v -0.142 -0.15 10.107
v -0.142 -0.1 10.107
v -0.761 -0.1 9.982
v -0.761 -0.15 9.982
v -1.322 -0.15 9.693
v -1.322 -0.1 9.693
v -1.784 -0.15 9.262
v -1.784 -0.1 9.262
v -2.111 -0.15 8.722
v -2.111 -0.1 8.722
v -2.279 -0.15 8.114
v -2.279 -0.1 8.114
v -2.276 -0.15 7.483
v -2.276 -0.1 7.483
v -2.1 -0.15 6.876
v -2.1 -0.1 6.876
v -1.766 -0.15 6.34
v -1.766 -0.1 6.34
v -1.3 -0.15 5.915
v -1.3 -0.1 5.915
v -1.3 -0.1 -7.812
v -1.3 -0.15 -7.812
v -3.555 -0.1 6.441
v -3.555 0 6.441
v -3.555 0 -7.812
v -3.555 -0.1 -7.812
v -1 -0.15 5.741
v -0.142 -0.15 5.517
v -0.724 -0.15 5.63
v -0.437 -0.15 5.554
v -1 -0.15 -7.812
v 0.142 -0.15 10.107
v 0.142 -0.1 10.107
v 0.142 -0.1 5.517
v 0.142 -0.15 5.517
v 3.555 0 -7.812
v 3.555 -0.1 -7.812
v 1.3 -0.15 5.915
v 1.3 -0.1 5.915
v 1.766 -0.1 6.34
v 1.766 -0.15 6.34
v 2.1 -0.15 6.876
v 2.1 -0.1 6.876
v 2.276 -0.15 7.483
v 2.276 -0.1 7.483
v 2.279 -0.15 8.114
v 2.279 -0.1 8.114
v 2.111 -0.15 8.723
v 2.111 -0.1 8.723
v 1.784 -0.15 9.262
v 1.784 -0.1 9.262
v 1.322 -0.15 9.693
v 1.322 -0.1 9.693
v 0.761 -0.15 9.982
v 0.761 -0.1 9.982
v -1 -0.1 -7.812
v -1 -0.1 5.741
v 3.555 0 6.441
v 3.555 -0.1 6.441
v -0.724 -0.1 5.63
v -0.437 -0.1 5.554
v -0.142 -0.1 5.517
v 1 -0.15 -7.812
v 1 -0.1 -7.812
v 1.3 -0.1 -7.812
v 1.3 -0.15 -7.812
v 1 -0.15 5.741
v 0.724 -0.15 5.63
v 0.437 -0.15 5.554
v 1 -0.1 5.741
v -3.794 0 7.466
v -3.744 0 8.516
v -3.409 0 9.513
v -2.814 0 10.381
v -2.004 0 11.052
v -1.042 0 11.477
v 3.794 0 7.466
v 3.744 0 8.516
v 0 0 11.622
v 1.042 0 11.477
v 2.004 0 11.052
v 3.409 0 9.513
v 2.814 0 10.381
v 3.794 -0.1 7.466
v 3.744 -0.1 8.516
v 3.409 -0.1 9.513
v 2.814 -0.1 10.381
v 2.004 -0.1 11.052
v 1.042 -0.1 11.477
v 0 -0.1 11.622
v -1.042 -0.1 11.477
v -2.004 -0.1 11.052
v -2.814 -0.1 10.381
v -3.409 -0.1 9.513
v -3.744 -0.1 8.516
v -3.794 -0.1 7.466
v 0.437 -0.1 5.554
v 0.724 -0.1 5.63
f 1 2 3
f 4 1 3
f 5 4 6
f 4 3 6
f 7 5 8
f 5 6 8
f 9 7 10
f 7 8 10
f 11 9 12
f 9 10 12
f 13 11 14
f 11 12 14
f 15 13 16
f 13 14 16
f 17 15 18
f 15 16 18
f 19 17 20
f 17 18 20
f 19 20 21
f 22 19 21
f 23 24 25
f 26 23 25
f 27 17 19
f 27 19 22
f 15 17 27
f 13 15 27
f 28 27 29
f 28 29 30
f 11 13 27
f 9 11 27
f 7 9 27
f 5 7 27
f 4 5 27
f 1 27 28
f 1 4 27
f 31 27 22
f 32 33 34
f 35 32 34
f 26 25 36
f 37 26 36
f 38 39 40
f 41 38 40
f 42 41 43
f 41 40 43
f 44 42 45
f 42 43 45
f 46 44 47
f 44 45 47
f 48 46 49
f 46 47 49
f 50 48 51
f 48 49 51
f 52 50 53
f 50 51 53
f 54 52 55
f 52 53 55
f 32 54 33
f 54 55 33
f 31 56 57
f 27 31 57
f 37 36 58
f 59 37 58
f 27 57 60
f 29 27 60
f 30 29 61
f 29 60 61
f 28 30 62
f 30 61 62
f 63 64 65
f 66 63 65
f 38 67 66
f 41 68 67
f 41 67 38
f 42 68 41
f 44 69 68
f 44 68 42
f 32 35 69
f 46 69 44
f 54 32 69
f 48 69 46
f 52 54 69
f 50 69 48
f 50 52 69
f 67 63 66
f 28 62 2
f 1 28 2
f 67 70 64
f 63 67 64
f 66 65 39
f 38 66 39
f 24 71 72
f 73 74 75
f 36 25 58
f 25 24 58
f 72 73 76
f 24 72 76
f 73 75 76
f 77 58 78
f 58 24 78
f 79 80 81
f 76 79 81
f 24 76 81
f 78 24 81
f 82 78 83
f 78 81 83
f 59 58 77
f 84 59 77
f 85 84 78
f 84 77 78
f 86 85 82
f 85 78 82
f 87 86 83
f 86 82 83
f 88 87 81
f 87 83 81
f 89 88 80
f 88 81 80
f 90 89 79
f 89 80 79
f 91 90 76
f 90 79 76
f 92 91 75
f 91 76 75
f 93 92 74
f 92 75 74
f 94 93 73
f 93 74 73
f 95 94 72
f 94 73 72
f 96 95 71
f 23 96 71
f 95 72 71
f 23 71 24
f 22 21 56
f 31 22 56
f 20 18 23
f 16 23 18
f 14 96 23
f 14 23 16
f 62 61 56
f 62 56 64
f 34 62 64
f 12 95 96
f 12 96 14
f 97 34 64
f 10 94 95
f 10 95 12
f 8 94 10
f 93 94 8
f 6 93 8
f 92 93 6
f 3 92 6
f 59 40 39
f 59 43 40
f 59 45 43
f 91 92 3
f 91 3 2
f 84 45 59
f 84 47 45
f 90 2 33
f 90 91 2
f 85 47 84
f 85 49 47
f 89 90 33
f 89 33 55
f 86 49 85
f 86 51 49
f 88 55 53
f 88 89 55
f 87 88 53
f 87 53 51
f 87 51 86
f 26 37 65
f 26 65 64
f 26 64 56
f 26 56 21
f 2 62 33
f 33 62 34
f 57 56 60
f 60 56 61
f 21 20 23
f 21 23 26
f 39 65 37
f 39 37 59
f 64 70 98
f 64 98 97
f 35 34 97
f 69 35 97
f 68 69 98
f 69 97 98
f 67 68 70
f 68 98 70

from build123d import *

# Parameters (mm, degrees)
F1_DEPTH = 0.1
F3_DEPTH = 0.05


with BuildPart() as f1:
    # F0 (on Front) → F1 (new body)
    with BuildSketch(Plane.XZ):
        with BuildLine():
            Line((-3.555, -7.811804), (3.555, -7.811804))
            Line((3.555, -7.811804), (3.555, 6.441375))
            ThreePointArc((3.555, 6.441375), (0, 11.621804), (-3.555, 6.441375))
            Line((-3.555, 6.441375), (-3.555, -7.811804))
        make_face()
    extrude(amount=F1_DEPTH)

    # F2 (on face) → F3 (join)
    with BuildSketch(Plane.XZ.offset(0.1)):
        with BuildLine():
            Line((-0.141701, 5.516975), (-0.141713, 10.106631))
            ThreePointArc((-0.141713, 10.106631), (-2.216193, 8.424019), (-1.2996, 5.915133))
            Line((-1.2996, 5.915133), (-1.2996, -7.811803))
            Line((-1.2996, -7.811803), (-0.9996, -7.811803))
            Line((-0.9996, -7.811803), (-0.9996, 5.741268))
            ThreePointArc((-0.9996, 5.741268), (-0.581566, 5.587371), (-0.141701, 5.516975))
        make_face()
        with BuildLine():
            ThreePointArc((1.2996, 5.915133), (2.216191, 8.424025), (0.141701, 10.106632))
            Line((0.141701, 10.106632), (0.141713, 5.516976))
            ThreePointArc((0.141713, 5.516976), (0.581571, 5.587373), (0.9996, 5.741268))
            Line((0.9996, 5.741268), (0.9996, -7.811803))
            Line((0.9996, -7.811803), (1.2996, -7.811803))
            Line((1.2996, -7.811803), (1.2996, 5.915133))
        make_face()
    extrude(amount=F3_DEPTH)


solid = f1.part
